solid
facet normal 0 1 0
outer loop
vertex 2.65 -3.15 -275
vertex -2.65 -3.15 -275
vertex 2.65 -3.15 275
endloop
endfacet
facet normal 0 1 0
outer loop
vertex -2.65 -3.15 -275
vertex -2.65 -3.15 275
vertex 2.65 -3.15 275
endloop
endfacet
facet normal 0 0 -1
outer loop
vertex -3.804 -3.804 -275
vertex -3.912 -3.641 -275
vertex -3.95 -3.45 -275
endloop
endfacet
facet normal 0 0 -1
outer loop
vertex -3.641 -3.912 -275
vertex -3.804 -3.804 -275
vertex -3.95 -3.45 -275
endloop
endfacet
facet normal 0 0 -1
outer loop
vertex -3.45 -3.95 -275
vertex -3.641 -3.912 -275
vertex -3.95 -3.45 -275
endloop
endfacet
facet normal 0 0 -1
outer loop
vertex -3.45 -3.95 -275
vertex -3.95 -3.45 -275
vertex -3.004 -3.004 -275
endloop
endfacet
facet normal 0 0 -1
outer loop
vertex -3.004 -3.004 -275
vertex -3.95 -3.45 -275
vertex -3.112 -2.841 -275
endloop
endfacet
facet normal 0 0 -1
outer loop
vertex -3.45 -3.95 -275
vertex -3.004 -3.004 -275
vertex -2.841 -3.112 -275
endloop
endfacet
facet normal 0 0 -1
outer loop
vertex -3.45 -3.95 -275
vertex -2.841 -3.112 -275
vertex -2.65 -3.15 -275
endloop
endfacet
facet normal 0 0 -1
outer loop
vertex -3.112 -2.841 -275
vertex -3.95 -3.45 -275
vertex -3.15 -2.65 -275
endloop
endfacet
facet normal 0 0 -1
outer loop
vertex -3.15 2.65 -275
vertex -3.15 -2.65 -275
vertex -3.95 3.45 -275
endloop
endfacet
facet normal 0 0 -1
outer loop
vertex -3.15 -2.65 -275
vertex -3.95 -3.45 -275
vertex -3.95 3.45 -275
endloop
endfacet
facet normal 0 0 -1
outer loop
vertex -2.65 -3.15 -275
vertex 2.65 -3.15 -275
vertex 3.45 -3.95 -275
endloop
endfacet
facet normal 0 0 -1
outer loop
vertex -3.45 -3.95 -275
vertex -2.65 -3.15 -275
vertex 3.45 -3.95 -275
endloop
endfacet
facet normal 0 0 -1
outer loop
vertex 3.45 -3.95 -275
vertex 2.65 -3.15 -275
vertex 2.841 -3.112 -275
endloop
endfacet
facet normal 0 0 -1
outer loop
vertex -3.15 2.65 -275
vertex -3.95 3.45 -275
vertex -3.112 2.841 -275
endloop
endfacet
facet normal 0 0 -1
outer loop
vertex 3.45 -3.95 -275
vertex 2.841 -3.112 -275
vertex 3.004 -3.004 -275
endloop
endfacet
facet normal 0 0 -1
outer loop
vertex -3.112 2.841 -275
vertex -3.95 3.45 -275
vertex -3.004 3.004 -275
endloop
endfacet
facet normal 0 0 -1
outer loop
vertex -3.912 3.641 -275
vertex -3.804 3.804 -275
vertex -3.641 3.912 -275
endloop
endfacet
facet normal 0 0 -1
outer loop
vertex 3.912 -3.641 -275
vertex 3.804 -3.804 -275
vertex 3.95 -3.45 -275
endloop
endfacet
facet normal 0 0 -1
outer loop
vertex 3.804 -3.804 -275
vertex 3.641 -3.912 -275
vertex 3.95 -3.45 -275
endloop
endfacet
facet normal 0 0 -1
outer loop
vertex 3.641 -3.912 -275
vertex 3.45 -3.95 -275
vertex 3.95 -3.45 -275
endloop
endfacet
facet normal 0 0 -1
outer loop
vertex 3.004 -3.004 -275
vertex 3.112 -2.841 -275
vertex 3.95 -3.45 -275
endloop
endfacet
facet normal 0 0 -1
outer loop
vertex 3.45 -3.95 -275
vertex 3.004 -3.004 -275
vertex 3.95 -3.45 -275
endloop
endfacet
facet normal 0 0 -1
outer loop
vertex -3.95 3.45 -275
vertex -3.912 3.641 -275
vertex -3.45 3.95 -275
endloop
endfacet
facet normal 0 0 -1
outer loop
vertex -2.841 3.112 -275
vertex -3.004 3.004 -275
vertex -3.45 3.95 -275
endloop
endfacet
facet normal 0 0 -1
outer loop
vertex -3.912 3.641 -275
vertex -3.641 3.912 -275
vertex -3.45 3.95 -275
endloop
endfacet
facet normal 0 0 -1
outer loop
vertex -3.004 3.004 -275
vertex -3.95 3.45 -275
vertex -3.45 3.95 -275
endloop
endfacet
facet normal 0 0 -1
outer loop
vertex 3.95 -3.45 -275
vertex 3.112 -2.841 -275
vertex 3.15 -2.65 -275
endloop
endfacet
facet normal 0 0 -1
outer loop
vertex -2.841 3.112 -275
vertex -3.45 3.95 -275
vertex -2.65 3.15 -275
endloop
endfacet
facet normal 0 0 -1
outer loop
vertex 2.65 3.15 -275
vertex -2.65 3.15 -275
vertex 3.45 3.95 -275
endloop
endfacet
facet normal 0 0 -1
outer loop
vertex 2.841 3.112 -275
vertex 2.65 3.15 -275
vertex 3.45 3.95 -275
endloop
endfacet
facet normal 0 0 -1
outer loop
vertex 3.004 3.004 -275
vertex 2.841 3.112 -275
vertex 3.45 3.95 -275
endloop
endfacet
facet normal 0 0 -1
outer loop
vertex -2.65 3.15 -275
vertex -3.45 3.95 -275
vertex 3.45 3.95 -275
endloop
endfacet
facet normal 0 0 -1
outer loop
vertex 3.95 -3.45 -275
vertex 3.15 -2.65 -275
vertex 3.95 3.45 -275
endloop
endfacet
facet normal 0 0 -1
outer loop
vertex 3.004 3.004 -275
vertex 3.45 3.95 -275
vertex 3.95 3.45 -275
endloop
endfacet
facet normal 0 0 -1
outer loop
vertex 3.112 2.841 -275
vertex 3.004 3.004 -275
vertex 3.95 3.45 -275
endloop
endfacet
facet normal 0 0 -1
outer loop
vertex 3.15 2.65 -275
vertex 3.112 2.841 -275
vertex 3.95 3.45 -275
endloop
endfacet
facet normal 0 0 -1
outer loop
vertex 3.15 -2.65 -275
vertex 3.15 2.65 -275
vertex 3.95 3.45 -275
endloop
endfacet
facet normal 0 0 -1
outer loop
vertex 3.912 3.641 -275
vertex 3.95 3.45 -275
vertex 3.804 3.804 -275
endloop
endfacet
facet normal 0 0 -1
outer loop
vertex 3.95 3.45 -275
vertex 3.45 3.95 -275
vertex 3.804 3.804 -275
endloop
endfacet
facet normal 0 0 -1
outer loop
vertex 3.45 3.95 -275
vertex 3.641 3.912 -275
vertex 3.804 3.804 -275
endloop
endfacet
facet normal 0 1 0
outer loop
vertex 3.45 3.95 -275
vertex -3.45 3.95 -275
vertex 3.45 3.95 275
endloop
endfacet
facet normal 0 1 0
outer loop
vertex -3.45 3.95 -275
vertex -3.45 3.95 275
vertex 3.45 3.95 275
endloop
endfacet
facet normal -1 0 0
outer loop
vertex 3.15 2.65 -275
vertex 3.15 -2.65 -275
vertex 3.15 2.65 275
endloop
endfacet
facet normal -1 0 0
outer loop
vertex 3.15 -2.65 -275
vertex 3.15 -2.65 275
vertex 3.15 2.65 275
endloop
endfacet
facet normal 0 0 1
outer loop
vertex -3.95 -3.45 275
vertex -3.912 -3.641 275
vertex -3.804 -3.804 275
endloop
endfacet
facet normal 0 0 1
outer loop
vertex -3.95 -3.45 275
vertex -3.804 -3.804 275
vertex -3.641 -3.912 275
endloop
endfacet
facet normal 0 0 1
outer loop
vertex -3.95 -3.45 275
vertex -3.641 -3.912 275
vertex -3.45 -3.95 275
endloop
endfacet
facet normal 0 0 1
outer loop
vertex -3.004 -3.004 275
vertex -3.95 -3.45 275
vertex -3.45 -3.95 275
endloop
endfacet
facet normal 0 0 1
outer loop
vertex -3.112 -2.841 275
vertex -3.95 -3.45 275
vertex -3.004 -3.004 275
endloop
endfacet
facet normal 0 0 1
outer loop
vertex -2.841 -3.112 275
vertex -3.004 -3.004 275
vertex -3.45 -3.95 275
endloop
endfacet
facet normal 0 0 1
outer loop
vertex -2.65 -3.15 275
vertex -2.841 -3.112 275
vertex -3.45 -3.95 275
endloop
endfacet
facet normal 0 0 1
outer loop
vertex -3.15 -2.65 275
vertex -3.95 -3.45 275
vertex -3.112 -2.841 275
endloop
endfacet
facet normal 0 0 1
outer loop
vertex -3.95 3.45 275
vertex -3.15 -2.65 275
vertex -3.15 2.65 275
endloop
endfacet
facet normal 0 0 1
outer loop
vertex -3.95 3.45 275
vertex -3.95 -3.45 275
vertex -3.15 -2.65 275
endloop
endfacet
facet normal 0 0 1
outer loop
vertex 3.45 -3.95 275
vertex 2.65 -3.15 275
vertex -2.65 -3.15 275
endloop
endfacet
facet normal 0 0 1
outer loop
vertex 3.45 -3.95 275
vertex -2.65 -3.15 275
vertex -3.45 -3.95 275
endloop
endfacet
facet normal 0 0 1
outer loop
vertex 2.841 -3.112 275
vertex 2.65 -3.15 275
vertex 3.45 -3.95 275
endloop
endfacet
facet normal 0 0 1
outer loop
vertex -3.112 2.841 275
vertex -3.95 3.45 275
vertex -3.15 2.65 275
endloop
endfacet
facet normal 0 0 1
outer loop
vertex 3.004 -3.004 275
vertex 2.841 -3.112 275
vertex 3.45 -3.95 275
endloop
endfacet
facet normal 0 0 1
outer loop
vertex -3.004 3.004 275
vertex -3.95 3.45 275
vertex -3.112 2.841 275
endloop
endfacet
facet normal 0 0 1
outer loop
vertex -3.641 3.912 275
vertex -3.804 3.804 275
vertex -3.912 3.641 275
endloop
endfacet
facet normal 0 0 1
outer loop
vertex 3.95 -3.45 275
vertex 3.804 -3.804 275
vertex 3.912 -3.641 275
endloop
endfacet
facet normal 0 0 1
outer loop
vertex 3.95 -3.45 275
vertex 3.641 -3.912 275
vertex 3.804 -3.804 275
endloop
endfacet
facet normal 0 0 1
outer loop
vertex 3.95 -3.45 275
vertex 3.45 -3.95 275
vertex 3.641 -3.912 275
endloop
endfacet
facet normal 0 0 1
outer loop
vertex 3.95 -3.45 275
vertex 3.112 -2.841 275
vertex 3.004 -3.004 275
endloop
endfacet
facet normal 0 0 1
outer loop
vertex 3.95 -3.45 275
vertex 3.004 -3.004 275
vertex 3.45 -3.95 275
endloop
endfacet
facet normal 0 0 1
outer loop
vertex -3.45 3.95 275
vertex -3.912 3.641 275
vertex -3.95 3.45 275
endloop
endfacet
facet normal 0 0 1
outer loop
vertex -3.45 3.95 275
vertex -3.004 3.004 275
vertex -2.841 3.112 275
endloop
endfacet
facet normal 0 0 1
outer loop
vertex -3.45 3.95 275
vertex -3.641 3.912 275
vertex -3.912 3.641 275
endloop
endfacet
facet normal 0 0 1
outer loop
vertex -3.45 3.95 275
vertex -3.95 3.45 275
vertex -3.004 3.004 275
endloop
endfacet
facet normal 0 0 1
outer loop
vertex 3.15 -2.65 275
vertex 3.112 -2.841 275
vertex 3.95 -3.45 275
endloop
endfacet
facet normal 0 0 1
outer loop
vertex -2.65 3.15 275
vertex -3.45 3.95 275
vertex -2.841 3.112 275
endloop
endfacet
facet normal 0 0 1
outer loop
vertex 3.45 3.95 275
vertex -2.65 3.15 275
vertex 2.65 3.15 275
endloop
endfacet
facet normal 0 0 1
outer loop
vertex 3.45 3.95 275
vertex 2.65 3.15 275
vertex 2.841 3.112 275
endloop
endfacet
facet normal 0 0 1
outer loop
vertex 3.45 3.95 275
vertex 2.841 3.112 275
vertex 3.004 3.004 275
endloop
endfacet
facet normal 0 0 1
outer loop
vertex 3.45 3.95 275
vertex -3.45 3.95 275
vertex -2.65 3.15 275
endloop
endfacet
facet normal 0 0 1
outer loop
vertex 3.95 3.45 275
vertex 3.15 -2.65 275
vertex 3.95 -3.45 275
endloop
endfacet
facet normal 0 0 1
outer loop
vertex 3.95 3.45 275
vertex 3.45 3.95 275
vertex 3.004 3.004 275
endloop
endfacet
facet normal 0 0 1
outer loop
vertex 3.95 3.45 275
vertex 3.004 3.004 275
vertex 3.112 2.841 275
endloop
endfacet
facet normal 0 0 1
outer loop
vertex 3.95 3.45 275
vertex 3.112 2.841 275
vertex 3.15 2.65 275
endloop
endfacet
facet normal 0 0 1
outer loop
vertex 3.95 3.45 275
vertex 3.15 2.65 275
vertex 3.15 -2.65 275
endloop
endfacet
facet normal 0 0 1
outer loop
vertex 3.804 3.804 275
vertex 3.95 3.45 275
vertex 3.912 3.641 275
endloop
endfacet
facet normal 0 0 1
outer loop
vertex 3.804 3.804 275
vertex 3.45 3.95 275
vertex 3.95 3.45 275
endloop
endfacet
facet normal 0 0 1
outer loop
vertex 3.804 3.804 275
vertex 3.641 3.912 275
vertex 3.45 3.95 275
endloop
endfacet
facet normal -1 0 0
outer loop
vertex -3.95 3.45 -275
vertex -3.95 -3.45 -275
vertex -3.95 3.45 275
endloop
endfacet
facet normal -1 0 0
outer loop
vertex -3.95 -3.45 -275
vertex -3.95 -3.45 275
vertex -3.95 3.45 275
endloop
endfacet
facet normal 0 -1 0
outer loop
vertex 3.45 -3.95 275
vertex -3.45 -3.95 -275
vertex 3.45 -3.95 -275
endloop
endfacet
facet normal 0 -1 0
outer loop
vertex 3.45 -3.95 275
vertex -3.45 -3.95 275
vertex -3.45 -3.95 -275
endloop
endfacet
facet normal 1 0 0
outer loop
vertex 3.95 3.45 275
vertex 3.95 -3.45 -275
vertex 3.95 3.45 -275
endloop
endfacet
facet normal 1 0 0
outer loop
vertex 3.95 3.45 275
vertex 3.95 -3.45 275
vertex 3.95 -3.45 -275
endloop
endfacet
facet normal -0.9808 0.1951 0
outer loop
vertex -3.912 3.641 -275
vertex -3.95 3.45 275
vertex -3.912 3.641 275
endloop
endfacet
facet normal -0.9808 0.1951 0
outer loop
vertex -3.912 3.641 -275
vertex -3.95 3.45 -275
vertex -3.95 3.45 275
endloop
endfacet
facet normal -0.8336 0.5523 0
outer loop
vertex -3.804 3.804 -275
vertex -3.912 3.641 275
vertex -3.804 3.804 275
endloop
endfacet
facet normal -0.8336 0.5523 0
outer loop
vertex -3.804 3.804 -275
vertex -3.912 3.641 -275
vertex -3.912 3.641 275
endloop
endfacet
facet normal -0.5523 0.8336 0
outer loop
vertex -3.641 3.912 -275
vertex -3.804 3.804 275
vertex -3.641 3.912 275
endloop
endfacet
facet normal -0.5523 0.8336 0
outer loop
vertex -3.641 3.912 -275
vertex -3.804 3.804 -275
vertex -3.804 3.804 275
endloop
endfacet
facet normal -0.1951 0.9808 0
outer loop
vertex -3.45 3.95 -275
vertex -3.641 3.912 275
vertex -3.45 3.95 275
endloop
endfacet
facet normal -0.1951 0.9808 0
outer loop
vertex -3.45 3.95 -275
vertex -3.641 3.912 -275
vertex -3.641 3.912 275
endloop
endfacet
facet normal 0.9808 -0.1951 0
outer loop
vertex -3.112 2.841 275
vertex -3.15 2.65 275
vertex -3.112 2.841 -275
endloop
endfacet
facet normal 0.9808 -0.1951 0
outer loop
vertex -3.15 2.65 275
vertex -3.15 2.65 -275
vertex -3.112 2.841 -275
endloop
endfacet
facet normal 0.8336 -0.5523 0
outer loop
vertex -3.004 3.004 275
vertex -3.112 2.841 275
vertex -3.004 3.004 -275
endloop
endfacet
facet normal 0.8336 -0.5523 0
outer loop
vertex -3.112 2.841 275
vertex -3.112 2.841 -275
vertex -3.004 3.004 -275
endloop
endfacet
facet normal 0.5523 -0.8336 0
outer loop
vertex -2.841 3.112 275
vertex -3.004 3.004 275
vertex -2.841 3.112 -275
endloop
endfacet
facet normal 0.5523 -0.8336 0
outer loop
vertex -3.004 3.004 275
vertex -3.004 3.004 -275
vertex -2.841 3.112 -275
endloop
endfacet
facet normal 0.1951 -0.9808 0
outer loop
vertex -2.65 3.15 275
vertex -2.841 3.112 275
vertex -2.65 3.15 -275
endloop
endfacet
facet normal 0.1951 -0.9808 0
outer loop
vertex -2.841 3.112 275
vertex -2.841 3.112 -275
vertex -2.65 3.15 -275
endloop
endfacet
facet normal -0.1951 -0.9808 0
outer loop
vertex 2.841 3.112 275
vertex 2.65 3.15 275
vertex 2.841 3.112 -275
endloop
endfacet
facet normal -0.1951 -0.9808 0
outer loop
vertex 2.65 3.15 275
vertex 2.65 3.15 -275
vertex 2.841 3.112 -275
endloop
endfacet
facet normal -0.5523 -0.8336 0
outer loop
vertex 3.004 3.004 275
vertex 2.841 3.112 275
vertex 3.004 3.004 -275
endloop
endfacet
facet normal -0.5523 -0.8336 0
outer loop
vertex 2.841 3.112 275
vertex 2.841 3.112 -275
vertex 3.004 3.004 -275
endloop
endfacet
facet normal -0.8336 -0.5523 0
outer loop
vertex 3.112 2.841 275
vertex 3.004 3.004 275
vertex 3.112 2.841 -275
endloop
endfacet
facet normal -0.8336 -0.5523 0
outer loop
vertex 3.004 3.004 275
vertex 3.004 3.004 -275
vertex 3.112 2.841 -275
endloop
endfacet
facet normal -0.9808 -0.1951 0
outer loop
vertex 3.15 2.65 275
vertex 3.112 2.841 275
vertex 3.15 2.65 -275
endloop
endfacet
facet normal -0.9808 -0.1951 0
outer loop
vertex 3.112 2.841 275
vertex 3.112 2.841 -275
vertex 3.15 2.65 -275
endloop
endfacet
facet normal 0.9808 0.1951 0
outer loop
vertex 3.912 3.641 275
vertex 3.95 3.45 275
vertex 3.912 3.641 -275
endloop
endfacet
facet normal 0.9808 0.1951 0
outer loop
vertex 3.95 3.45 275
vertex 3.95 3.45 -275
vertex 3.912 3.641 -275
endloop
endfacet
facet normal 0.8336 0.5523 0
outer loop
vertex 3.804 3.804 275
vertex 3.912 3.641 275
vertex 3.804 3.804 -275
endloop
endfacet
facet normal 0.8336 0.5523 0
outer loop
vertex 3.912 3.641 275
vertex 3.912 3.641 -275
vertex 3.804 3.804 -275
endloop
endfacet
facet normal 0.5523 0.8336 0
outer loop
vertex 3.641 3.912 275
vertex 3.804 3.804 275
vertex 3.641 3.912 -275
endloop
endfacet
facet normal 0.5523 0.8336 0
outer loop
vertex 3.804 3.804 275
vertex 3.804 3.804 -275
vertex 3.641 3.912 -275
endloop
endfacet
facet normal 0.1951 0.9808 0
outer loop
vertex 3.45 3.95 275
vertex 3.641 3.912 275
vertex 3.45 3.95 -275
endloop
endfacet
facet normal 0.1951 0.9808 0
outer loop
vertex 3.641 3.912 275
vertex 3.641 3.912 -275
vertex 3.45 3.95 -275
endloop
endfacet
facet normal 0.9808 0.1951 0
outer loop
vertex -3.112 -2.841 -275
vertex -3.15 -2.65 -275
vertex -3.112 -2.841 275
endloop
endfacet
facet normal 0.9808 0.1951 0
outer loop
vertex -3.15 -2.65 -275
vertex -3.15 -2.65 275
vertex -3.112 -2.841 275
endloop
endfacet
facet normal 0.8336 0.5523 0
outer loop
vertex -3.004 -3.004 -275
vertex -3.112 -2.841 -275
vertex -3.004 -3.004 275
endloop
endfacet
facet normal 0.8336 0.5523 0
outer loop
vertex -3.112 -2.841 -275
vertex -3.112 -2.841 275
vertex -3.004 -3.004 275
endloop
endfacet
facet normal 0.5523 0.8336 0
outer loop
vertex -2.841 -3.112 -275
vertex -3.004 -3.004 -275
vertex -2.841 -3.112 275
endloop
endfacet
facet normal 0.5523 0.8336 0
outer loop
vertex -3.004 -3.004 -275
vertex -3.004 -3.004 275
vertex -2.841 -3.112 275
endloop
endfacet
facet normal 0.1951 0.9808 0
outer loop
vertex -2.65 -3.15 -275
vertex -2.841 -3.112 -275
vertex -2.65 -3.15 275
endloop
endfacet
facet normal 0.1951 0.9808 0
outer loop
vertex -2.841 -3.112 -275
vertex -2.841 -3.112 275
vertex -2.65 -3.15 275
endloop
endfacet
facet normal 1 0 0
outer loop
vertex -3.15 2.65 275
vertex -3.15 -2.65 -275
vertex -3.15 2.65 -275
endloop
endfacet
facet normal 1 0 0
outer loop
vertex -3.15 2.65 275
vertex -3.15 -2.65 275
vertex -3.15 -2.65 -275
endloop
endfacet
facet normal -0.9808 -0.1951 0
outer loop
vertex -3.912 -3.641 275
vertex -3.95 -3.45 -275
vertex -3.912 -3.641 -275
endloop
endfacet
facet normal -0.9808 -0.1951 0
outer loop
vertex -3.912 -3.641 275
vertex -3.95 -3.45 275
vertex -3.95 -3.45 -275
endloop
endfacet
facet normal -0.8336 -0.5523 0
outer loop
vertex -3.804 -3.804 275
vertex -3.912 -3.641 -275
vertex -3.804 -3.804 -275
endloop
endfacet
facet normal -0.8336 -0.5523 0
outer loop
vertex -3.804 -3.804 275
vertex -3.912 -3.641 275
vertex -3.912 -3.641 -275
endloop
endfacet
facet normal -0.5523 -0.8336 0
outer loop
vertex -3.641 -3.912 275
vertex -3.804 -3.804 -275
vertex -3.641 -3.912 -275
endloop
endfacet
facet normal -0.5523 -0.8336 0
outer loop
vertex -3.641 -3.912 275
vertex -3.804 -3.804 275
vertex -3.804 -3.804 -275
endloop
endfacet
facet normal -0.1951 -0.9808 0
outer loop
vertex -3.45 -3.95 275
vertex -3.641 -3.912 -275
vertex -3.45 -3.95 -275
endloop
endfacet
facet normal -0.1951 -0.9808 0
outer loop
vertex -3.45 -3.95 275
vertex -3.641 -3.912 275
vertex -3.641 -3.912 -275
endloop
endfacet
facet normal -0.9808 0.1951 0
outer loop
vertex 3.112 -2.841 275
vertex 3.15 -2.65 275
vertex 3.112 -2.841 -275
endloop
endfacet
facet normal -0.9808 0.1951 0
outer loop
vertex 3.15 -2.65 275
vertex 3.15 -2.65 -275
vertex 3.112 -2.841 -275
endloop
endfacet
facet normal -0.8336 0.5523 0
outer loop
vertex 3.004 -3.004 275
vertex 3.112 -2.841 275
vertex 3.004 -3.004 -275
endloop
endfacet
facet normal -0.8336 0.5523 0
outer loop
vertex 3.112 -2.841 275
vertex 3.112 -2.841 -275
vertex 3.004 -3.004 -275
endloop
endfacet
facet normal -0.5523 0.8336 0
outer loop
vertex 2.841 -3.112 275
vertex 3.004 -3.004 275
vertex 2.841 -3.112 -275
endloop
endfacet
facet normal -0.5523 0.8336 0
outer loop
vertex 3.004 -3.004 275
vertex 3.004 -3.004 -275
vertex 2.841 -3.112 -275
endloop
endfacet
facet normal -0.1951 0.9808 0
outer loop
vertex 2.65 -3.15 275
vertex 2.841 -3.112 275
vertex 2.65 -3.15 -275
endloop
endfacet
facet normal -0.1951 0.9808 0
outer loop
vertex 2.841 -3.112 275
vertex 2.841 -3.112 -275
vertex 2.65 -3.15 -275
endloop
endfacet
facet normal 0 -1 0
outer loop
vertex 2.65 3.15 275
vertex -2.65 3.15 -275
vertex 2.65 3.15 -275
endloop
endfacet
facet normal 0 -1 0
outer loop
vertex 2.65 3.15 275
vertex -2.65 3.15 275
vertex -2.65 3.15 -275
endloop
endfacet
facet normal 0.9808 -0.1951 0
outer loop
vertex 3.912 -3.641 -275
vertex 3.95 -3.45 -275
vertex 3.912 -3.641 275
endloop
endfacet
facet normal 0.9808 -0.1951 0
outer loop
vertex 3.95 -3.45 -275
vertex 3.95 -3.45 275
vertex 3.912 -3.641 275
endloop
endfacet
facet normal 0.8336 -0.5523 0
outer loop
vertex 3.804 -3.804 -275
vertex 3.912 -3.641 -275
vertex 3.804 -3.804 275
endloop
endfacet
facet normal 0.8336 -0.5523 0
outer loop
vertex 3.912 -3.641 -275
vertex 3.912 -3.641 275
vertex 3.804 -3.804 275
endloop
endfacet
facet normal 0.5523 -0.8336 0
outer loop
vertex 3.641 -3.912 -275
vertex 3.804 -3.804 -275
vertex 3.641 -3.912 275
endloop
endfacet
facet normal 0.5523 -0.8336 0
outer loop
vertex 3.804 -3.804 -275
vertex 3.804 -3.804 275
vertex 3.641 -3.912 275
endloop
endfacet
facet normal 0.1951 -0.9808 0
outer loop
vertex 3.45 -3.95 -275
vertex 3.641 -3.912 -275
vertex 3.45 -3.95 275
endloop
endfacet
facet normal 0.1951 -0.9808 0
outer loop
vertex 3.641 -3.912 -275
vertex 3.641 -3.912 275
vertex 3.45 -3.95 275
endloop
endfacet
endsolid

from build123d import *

# Parameters (mm, degrees)
SKETCH1_W           = 7.9
SKETCH1_H           = 7.9
SKETCH1_W_2         = 6.3
SKETCH1_H_2         = 6.3
BOSS_EXTRUDE1_DEPTH = 275
FILLET1_R           = 0.5


with BuildPart() as part:
    # Sketch1 → Boss-Extrude1 (new body, symmetric)
    with BuildSketch(Plane.XY):
        Rectangle(SKETCH1_W, SKETCH1_H)
        Rectangle(SKETCH1_W_2, SKETCH1_H_2, mode=Mode.SUBTRACT)
    extrude(amount=BOSS_EXTRUDE1_DEPTH, both=True)

    # Fillet1
    fillet1_edges = [part.edges().sort_by_distance(p)[0] for p in [
        (3.15, -3.15, 0),
        (3.15, 3.15, 0),
        (-3.15, 3.15, 0),
        (-3.15, -3.15, 0),
        (3.95, -3.95, 0),
        (-3.95, -3.95, 0),
        (-3.95, 3.95, 0),
        (3.95, 3.95, 0),
    ]]
    fillet(fillet1_edges, radius=FILLET1_R)


solid = part.part
